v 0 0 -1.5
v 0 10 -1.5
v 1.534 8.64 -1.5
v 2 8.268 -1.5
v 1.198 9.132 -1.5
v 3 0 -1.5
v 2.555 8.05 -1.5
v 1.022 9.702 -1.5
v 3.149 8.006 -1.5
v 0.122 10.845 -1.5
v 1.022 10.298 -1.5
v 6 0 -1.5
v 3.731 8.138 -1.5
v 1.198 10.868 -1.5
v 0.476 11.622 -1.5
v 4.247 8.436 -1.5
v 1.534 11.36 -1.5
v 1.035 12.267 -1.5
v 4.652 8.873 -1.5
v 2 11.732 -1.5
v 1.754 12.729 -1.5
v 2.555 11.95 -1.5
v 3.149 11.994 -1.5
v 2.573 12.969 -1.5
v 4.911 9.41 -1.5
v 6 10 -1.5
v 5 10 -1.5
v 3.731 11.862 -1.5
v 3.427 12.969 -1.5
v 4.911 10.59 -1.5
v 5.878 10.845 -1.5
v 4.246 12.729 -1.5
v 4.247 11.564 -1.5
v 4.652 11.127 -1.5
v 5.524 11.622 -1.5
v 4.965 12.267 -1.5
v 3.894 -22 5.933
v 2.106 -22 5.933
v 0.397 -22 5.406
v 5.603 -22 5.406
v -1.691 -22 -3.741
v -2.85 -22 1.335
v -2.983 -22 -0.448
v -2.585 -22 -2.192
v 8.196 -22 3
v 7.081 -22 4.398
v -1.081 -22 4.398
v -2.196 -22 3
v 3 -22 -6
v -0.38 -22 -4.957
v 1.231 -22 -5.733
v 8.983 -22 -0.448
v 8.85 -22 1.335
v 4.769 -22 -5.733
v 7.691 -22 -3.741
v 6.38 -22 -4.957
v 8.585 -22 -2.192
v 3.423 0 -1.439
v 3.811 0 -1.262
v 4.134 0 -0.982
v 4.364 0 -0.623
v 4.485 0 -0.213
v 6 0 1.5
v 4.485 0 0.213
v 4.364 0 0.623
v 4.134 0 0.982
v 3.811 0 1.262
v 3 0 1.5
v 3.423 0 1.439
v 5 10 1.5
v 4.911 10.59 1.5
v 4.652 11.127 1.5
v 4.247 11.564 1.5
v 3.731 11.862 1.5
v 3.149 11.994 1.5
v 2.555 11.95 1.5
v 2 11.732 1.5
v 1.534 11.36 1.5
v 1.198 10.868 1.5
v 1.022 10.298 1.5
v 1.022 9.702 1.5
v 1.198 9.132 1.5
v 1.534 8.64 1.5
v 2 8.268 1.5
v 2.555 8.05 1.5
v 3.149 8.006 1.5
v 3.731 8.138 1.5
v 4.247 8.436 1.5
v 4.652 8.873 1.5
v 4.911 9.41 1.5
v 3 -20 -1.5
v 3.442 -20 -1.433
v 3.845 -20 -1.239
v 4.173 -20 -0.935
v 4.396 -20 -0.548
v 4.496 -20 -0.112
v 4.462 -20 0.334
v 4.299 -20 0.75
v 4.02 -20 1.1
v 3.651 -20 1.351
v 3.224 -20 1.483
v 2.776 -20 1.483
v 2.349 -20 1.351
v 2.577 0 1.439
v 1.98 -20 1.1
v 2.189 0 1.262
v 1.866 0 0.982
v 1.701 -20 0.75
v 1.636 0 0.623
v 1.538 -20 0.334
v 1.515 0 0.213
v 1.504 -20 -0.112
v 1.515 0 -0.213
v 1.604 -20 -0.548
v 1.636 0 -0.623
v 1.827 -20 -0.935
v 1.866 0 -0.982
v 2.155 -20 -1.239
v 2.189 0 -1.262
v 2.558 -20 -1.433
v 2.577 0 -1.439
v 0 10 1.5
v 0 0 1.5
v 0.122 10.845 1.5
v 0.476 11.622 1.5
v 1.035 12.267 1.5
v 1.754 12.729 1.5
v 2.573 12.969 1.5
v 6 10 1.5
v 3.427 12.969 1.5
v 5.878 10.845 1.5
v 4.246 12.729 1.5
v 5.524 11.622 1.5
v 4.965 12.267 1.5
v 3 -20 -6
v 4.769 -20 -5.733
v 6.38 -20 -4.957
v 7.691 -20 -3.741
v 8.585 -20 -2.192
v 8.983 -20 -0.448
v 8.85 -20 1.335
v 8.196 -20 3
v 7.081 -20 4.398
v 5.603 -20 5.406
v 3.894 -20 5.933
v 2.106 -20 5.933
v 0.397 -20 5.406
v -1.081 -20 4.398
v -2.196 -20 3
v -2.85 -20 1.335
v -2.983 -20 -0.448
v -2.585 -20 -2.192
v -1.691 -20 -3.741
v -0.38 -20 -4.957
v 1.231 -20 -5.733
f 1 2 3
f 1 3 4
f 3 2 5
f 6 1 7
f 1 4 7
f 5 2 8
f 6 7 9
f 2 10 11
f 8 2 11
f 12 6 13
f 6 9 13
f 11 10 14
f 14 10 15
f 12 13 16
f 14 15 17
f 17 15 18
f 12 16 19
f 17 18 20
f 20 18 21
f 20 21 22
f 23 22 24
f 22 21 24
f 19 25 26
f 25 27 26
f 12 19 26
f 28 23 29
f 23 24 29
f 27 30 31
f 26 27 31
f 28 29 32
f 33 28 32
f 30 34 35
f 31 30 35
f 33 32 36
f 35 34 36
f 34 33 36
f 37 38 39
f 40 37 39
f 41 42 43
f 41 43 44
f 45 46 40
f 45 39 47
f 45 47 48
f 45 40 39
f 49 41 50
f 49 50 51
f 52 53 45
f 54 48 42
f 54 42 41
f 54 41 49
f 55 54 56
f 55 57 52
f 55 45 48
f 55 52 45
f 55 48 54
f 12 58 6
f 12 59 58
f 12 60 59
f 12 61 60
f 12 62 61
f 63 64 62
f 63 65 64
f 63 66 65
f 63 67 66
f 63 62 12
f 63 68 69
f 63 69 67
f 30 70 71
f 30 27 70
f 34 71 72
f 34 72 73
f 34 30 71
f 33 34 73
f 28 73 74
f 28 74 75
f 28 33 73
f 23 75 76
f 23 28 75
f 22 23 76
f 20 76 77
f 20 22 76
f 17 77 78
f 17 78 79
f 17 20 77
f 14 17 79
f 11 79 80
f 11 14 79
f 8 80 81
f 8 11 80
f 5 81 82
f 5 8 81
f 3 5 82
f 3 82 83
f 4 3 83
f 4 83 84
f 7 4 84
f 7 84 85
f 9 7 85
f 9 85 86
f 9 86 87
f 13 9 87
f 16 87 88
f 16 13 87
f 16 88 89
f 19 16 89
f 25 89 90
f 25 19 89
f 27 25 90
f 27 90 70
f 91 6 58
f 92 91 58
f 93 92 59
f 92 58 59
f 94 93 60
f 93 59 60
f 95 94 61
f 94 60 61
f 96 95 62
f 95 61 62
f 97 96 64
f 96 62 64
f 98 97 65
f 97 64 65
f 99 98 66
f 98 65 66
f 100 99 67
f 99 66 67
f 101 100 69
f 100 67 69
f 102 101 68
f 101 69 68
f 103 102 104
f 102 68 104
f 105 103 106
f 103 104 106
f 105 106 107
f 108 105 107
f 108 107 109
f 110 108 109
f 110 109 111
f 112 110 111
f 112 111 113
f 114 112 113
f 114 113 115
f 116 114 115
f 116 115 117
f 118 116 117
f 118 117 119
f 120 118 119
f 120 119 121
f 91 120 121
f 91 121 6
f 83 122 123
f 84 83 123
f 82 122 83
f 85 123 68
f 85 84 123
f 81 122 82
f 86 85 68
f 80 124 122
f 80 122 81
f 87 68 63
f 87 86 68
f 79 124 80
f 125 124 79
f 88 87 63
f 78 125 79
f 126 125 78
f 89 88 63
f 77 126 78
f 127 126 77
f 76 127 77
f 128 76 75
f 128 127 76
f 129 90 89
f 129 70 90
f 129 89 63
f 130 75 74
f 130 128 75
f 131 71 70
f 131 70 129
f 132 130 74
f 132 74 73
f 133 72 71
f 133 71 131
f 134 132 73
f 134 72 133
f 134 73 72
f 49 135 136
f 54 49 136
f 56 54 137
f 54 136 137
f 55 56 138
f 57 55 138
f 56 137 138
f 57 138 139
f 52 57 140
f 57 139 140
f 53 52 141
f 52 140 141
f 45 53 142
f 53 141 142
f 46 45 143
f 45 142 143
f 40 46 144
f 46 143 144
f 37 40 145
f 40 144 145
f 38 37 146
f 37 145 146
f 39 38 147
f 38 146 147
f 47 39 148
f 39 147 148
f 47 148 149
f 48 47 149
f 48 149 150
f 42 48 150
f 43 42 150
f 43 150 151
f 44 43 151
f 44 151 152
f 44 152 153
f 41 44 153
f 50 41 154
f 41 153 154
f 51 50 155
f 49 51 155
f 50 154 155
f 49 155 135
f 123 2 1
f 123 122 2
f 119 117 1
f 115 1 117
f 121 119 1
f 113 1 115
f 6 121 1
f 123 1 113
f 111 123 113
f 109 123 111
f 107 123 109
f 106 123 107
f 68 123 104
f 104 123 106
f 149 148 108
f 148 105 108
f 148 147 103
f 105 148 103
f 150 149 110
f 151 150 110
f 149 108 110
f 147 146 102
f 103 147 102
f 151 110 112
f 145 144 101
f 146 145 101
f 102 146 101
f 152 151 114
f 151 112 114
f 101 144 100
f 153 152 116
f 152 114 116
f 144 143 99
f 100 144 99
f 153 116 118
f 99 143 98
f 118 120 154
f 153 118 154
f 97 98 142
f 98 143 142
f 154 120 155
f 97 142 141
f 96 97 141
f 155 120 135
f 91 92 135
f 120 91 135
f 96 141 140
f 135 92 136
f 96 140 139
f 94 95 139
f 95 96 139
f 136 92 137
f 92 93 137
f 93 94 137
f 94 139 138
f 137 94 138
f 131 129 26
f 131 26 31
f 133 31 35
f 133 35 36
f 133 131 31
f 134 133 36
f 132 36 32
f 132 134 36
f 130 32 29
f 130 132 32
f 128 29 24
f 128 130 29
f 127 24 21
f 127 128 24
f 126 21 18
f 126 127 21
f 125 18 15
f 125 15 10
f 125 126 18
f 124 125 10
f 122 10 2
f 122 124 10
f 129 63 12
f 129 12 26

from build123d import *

# Parameters (mm, degrees)
SKETCH_1_R      = 2
EXTRUDE_1_DEPTH = 1.5
SKETCH_2_R      = 1.5
EXTRUDE_2_DEPTH = 20
SKETCH_3_R      = 6
EXTRUDE_3_DEPTH = 2


with BuildPart() as part:
    # 草图1 → 凸台-拉伸1 (new, symmetric)
    with BuildSketch(Plane.XY):
        with BuildLine():
            Line((0, 0), (6, 0))
            Line((6, 0), (6, 10))
            ThreePointArc((6, 10), (3, 13), (0, 10))
            Line((0, 10), (0, 0))
        make_face()
        with Locations((3, 10)):
            Circle(SKETCH_1_R, mode=Mode.SUBTRACT)
    extrude(amount=EXTRUDE_1_DEPTH, both=True)

    # 草图2 → 凸台-拉伸2 (add)
    with BuildSketch(Plane.XZ):
        with Locations(Location((3, 0, 0), (0, 0, 270))):
            Circle(SKETCH_2_R)
    extrude(amount=EXTRUDE_2_DEPTH)

    # 草图3 → 凸台-拉伸3 (add)
    with BuildSketch(Plane.XZ.offset(20)):
        with Locations(Location((3, 0, 0), (0, 0, 270))):
            Circle(SKETCH_3_R)
    extrude(amount=EXTRUDE_3_DEPTH)


solid = part.part
